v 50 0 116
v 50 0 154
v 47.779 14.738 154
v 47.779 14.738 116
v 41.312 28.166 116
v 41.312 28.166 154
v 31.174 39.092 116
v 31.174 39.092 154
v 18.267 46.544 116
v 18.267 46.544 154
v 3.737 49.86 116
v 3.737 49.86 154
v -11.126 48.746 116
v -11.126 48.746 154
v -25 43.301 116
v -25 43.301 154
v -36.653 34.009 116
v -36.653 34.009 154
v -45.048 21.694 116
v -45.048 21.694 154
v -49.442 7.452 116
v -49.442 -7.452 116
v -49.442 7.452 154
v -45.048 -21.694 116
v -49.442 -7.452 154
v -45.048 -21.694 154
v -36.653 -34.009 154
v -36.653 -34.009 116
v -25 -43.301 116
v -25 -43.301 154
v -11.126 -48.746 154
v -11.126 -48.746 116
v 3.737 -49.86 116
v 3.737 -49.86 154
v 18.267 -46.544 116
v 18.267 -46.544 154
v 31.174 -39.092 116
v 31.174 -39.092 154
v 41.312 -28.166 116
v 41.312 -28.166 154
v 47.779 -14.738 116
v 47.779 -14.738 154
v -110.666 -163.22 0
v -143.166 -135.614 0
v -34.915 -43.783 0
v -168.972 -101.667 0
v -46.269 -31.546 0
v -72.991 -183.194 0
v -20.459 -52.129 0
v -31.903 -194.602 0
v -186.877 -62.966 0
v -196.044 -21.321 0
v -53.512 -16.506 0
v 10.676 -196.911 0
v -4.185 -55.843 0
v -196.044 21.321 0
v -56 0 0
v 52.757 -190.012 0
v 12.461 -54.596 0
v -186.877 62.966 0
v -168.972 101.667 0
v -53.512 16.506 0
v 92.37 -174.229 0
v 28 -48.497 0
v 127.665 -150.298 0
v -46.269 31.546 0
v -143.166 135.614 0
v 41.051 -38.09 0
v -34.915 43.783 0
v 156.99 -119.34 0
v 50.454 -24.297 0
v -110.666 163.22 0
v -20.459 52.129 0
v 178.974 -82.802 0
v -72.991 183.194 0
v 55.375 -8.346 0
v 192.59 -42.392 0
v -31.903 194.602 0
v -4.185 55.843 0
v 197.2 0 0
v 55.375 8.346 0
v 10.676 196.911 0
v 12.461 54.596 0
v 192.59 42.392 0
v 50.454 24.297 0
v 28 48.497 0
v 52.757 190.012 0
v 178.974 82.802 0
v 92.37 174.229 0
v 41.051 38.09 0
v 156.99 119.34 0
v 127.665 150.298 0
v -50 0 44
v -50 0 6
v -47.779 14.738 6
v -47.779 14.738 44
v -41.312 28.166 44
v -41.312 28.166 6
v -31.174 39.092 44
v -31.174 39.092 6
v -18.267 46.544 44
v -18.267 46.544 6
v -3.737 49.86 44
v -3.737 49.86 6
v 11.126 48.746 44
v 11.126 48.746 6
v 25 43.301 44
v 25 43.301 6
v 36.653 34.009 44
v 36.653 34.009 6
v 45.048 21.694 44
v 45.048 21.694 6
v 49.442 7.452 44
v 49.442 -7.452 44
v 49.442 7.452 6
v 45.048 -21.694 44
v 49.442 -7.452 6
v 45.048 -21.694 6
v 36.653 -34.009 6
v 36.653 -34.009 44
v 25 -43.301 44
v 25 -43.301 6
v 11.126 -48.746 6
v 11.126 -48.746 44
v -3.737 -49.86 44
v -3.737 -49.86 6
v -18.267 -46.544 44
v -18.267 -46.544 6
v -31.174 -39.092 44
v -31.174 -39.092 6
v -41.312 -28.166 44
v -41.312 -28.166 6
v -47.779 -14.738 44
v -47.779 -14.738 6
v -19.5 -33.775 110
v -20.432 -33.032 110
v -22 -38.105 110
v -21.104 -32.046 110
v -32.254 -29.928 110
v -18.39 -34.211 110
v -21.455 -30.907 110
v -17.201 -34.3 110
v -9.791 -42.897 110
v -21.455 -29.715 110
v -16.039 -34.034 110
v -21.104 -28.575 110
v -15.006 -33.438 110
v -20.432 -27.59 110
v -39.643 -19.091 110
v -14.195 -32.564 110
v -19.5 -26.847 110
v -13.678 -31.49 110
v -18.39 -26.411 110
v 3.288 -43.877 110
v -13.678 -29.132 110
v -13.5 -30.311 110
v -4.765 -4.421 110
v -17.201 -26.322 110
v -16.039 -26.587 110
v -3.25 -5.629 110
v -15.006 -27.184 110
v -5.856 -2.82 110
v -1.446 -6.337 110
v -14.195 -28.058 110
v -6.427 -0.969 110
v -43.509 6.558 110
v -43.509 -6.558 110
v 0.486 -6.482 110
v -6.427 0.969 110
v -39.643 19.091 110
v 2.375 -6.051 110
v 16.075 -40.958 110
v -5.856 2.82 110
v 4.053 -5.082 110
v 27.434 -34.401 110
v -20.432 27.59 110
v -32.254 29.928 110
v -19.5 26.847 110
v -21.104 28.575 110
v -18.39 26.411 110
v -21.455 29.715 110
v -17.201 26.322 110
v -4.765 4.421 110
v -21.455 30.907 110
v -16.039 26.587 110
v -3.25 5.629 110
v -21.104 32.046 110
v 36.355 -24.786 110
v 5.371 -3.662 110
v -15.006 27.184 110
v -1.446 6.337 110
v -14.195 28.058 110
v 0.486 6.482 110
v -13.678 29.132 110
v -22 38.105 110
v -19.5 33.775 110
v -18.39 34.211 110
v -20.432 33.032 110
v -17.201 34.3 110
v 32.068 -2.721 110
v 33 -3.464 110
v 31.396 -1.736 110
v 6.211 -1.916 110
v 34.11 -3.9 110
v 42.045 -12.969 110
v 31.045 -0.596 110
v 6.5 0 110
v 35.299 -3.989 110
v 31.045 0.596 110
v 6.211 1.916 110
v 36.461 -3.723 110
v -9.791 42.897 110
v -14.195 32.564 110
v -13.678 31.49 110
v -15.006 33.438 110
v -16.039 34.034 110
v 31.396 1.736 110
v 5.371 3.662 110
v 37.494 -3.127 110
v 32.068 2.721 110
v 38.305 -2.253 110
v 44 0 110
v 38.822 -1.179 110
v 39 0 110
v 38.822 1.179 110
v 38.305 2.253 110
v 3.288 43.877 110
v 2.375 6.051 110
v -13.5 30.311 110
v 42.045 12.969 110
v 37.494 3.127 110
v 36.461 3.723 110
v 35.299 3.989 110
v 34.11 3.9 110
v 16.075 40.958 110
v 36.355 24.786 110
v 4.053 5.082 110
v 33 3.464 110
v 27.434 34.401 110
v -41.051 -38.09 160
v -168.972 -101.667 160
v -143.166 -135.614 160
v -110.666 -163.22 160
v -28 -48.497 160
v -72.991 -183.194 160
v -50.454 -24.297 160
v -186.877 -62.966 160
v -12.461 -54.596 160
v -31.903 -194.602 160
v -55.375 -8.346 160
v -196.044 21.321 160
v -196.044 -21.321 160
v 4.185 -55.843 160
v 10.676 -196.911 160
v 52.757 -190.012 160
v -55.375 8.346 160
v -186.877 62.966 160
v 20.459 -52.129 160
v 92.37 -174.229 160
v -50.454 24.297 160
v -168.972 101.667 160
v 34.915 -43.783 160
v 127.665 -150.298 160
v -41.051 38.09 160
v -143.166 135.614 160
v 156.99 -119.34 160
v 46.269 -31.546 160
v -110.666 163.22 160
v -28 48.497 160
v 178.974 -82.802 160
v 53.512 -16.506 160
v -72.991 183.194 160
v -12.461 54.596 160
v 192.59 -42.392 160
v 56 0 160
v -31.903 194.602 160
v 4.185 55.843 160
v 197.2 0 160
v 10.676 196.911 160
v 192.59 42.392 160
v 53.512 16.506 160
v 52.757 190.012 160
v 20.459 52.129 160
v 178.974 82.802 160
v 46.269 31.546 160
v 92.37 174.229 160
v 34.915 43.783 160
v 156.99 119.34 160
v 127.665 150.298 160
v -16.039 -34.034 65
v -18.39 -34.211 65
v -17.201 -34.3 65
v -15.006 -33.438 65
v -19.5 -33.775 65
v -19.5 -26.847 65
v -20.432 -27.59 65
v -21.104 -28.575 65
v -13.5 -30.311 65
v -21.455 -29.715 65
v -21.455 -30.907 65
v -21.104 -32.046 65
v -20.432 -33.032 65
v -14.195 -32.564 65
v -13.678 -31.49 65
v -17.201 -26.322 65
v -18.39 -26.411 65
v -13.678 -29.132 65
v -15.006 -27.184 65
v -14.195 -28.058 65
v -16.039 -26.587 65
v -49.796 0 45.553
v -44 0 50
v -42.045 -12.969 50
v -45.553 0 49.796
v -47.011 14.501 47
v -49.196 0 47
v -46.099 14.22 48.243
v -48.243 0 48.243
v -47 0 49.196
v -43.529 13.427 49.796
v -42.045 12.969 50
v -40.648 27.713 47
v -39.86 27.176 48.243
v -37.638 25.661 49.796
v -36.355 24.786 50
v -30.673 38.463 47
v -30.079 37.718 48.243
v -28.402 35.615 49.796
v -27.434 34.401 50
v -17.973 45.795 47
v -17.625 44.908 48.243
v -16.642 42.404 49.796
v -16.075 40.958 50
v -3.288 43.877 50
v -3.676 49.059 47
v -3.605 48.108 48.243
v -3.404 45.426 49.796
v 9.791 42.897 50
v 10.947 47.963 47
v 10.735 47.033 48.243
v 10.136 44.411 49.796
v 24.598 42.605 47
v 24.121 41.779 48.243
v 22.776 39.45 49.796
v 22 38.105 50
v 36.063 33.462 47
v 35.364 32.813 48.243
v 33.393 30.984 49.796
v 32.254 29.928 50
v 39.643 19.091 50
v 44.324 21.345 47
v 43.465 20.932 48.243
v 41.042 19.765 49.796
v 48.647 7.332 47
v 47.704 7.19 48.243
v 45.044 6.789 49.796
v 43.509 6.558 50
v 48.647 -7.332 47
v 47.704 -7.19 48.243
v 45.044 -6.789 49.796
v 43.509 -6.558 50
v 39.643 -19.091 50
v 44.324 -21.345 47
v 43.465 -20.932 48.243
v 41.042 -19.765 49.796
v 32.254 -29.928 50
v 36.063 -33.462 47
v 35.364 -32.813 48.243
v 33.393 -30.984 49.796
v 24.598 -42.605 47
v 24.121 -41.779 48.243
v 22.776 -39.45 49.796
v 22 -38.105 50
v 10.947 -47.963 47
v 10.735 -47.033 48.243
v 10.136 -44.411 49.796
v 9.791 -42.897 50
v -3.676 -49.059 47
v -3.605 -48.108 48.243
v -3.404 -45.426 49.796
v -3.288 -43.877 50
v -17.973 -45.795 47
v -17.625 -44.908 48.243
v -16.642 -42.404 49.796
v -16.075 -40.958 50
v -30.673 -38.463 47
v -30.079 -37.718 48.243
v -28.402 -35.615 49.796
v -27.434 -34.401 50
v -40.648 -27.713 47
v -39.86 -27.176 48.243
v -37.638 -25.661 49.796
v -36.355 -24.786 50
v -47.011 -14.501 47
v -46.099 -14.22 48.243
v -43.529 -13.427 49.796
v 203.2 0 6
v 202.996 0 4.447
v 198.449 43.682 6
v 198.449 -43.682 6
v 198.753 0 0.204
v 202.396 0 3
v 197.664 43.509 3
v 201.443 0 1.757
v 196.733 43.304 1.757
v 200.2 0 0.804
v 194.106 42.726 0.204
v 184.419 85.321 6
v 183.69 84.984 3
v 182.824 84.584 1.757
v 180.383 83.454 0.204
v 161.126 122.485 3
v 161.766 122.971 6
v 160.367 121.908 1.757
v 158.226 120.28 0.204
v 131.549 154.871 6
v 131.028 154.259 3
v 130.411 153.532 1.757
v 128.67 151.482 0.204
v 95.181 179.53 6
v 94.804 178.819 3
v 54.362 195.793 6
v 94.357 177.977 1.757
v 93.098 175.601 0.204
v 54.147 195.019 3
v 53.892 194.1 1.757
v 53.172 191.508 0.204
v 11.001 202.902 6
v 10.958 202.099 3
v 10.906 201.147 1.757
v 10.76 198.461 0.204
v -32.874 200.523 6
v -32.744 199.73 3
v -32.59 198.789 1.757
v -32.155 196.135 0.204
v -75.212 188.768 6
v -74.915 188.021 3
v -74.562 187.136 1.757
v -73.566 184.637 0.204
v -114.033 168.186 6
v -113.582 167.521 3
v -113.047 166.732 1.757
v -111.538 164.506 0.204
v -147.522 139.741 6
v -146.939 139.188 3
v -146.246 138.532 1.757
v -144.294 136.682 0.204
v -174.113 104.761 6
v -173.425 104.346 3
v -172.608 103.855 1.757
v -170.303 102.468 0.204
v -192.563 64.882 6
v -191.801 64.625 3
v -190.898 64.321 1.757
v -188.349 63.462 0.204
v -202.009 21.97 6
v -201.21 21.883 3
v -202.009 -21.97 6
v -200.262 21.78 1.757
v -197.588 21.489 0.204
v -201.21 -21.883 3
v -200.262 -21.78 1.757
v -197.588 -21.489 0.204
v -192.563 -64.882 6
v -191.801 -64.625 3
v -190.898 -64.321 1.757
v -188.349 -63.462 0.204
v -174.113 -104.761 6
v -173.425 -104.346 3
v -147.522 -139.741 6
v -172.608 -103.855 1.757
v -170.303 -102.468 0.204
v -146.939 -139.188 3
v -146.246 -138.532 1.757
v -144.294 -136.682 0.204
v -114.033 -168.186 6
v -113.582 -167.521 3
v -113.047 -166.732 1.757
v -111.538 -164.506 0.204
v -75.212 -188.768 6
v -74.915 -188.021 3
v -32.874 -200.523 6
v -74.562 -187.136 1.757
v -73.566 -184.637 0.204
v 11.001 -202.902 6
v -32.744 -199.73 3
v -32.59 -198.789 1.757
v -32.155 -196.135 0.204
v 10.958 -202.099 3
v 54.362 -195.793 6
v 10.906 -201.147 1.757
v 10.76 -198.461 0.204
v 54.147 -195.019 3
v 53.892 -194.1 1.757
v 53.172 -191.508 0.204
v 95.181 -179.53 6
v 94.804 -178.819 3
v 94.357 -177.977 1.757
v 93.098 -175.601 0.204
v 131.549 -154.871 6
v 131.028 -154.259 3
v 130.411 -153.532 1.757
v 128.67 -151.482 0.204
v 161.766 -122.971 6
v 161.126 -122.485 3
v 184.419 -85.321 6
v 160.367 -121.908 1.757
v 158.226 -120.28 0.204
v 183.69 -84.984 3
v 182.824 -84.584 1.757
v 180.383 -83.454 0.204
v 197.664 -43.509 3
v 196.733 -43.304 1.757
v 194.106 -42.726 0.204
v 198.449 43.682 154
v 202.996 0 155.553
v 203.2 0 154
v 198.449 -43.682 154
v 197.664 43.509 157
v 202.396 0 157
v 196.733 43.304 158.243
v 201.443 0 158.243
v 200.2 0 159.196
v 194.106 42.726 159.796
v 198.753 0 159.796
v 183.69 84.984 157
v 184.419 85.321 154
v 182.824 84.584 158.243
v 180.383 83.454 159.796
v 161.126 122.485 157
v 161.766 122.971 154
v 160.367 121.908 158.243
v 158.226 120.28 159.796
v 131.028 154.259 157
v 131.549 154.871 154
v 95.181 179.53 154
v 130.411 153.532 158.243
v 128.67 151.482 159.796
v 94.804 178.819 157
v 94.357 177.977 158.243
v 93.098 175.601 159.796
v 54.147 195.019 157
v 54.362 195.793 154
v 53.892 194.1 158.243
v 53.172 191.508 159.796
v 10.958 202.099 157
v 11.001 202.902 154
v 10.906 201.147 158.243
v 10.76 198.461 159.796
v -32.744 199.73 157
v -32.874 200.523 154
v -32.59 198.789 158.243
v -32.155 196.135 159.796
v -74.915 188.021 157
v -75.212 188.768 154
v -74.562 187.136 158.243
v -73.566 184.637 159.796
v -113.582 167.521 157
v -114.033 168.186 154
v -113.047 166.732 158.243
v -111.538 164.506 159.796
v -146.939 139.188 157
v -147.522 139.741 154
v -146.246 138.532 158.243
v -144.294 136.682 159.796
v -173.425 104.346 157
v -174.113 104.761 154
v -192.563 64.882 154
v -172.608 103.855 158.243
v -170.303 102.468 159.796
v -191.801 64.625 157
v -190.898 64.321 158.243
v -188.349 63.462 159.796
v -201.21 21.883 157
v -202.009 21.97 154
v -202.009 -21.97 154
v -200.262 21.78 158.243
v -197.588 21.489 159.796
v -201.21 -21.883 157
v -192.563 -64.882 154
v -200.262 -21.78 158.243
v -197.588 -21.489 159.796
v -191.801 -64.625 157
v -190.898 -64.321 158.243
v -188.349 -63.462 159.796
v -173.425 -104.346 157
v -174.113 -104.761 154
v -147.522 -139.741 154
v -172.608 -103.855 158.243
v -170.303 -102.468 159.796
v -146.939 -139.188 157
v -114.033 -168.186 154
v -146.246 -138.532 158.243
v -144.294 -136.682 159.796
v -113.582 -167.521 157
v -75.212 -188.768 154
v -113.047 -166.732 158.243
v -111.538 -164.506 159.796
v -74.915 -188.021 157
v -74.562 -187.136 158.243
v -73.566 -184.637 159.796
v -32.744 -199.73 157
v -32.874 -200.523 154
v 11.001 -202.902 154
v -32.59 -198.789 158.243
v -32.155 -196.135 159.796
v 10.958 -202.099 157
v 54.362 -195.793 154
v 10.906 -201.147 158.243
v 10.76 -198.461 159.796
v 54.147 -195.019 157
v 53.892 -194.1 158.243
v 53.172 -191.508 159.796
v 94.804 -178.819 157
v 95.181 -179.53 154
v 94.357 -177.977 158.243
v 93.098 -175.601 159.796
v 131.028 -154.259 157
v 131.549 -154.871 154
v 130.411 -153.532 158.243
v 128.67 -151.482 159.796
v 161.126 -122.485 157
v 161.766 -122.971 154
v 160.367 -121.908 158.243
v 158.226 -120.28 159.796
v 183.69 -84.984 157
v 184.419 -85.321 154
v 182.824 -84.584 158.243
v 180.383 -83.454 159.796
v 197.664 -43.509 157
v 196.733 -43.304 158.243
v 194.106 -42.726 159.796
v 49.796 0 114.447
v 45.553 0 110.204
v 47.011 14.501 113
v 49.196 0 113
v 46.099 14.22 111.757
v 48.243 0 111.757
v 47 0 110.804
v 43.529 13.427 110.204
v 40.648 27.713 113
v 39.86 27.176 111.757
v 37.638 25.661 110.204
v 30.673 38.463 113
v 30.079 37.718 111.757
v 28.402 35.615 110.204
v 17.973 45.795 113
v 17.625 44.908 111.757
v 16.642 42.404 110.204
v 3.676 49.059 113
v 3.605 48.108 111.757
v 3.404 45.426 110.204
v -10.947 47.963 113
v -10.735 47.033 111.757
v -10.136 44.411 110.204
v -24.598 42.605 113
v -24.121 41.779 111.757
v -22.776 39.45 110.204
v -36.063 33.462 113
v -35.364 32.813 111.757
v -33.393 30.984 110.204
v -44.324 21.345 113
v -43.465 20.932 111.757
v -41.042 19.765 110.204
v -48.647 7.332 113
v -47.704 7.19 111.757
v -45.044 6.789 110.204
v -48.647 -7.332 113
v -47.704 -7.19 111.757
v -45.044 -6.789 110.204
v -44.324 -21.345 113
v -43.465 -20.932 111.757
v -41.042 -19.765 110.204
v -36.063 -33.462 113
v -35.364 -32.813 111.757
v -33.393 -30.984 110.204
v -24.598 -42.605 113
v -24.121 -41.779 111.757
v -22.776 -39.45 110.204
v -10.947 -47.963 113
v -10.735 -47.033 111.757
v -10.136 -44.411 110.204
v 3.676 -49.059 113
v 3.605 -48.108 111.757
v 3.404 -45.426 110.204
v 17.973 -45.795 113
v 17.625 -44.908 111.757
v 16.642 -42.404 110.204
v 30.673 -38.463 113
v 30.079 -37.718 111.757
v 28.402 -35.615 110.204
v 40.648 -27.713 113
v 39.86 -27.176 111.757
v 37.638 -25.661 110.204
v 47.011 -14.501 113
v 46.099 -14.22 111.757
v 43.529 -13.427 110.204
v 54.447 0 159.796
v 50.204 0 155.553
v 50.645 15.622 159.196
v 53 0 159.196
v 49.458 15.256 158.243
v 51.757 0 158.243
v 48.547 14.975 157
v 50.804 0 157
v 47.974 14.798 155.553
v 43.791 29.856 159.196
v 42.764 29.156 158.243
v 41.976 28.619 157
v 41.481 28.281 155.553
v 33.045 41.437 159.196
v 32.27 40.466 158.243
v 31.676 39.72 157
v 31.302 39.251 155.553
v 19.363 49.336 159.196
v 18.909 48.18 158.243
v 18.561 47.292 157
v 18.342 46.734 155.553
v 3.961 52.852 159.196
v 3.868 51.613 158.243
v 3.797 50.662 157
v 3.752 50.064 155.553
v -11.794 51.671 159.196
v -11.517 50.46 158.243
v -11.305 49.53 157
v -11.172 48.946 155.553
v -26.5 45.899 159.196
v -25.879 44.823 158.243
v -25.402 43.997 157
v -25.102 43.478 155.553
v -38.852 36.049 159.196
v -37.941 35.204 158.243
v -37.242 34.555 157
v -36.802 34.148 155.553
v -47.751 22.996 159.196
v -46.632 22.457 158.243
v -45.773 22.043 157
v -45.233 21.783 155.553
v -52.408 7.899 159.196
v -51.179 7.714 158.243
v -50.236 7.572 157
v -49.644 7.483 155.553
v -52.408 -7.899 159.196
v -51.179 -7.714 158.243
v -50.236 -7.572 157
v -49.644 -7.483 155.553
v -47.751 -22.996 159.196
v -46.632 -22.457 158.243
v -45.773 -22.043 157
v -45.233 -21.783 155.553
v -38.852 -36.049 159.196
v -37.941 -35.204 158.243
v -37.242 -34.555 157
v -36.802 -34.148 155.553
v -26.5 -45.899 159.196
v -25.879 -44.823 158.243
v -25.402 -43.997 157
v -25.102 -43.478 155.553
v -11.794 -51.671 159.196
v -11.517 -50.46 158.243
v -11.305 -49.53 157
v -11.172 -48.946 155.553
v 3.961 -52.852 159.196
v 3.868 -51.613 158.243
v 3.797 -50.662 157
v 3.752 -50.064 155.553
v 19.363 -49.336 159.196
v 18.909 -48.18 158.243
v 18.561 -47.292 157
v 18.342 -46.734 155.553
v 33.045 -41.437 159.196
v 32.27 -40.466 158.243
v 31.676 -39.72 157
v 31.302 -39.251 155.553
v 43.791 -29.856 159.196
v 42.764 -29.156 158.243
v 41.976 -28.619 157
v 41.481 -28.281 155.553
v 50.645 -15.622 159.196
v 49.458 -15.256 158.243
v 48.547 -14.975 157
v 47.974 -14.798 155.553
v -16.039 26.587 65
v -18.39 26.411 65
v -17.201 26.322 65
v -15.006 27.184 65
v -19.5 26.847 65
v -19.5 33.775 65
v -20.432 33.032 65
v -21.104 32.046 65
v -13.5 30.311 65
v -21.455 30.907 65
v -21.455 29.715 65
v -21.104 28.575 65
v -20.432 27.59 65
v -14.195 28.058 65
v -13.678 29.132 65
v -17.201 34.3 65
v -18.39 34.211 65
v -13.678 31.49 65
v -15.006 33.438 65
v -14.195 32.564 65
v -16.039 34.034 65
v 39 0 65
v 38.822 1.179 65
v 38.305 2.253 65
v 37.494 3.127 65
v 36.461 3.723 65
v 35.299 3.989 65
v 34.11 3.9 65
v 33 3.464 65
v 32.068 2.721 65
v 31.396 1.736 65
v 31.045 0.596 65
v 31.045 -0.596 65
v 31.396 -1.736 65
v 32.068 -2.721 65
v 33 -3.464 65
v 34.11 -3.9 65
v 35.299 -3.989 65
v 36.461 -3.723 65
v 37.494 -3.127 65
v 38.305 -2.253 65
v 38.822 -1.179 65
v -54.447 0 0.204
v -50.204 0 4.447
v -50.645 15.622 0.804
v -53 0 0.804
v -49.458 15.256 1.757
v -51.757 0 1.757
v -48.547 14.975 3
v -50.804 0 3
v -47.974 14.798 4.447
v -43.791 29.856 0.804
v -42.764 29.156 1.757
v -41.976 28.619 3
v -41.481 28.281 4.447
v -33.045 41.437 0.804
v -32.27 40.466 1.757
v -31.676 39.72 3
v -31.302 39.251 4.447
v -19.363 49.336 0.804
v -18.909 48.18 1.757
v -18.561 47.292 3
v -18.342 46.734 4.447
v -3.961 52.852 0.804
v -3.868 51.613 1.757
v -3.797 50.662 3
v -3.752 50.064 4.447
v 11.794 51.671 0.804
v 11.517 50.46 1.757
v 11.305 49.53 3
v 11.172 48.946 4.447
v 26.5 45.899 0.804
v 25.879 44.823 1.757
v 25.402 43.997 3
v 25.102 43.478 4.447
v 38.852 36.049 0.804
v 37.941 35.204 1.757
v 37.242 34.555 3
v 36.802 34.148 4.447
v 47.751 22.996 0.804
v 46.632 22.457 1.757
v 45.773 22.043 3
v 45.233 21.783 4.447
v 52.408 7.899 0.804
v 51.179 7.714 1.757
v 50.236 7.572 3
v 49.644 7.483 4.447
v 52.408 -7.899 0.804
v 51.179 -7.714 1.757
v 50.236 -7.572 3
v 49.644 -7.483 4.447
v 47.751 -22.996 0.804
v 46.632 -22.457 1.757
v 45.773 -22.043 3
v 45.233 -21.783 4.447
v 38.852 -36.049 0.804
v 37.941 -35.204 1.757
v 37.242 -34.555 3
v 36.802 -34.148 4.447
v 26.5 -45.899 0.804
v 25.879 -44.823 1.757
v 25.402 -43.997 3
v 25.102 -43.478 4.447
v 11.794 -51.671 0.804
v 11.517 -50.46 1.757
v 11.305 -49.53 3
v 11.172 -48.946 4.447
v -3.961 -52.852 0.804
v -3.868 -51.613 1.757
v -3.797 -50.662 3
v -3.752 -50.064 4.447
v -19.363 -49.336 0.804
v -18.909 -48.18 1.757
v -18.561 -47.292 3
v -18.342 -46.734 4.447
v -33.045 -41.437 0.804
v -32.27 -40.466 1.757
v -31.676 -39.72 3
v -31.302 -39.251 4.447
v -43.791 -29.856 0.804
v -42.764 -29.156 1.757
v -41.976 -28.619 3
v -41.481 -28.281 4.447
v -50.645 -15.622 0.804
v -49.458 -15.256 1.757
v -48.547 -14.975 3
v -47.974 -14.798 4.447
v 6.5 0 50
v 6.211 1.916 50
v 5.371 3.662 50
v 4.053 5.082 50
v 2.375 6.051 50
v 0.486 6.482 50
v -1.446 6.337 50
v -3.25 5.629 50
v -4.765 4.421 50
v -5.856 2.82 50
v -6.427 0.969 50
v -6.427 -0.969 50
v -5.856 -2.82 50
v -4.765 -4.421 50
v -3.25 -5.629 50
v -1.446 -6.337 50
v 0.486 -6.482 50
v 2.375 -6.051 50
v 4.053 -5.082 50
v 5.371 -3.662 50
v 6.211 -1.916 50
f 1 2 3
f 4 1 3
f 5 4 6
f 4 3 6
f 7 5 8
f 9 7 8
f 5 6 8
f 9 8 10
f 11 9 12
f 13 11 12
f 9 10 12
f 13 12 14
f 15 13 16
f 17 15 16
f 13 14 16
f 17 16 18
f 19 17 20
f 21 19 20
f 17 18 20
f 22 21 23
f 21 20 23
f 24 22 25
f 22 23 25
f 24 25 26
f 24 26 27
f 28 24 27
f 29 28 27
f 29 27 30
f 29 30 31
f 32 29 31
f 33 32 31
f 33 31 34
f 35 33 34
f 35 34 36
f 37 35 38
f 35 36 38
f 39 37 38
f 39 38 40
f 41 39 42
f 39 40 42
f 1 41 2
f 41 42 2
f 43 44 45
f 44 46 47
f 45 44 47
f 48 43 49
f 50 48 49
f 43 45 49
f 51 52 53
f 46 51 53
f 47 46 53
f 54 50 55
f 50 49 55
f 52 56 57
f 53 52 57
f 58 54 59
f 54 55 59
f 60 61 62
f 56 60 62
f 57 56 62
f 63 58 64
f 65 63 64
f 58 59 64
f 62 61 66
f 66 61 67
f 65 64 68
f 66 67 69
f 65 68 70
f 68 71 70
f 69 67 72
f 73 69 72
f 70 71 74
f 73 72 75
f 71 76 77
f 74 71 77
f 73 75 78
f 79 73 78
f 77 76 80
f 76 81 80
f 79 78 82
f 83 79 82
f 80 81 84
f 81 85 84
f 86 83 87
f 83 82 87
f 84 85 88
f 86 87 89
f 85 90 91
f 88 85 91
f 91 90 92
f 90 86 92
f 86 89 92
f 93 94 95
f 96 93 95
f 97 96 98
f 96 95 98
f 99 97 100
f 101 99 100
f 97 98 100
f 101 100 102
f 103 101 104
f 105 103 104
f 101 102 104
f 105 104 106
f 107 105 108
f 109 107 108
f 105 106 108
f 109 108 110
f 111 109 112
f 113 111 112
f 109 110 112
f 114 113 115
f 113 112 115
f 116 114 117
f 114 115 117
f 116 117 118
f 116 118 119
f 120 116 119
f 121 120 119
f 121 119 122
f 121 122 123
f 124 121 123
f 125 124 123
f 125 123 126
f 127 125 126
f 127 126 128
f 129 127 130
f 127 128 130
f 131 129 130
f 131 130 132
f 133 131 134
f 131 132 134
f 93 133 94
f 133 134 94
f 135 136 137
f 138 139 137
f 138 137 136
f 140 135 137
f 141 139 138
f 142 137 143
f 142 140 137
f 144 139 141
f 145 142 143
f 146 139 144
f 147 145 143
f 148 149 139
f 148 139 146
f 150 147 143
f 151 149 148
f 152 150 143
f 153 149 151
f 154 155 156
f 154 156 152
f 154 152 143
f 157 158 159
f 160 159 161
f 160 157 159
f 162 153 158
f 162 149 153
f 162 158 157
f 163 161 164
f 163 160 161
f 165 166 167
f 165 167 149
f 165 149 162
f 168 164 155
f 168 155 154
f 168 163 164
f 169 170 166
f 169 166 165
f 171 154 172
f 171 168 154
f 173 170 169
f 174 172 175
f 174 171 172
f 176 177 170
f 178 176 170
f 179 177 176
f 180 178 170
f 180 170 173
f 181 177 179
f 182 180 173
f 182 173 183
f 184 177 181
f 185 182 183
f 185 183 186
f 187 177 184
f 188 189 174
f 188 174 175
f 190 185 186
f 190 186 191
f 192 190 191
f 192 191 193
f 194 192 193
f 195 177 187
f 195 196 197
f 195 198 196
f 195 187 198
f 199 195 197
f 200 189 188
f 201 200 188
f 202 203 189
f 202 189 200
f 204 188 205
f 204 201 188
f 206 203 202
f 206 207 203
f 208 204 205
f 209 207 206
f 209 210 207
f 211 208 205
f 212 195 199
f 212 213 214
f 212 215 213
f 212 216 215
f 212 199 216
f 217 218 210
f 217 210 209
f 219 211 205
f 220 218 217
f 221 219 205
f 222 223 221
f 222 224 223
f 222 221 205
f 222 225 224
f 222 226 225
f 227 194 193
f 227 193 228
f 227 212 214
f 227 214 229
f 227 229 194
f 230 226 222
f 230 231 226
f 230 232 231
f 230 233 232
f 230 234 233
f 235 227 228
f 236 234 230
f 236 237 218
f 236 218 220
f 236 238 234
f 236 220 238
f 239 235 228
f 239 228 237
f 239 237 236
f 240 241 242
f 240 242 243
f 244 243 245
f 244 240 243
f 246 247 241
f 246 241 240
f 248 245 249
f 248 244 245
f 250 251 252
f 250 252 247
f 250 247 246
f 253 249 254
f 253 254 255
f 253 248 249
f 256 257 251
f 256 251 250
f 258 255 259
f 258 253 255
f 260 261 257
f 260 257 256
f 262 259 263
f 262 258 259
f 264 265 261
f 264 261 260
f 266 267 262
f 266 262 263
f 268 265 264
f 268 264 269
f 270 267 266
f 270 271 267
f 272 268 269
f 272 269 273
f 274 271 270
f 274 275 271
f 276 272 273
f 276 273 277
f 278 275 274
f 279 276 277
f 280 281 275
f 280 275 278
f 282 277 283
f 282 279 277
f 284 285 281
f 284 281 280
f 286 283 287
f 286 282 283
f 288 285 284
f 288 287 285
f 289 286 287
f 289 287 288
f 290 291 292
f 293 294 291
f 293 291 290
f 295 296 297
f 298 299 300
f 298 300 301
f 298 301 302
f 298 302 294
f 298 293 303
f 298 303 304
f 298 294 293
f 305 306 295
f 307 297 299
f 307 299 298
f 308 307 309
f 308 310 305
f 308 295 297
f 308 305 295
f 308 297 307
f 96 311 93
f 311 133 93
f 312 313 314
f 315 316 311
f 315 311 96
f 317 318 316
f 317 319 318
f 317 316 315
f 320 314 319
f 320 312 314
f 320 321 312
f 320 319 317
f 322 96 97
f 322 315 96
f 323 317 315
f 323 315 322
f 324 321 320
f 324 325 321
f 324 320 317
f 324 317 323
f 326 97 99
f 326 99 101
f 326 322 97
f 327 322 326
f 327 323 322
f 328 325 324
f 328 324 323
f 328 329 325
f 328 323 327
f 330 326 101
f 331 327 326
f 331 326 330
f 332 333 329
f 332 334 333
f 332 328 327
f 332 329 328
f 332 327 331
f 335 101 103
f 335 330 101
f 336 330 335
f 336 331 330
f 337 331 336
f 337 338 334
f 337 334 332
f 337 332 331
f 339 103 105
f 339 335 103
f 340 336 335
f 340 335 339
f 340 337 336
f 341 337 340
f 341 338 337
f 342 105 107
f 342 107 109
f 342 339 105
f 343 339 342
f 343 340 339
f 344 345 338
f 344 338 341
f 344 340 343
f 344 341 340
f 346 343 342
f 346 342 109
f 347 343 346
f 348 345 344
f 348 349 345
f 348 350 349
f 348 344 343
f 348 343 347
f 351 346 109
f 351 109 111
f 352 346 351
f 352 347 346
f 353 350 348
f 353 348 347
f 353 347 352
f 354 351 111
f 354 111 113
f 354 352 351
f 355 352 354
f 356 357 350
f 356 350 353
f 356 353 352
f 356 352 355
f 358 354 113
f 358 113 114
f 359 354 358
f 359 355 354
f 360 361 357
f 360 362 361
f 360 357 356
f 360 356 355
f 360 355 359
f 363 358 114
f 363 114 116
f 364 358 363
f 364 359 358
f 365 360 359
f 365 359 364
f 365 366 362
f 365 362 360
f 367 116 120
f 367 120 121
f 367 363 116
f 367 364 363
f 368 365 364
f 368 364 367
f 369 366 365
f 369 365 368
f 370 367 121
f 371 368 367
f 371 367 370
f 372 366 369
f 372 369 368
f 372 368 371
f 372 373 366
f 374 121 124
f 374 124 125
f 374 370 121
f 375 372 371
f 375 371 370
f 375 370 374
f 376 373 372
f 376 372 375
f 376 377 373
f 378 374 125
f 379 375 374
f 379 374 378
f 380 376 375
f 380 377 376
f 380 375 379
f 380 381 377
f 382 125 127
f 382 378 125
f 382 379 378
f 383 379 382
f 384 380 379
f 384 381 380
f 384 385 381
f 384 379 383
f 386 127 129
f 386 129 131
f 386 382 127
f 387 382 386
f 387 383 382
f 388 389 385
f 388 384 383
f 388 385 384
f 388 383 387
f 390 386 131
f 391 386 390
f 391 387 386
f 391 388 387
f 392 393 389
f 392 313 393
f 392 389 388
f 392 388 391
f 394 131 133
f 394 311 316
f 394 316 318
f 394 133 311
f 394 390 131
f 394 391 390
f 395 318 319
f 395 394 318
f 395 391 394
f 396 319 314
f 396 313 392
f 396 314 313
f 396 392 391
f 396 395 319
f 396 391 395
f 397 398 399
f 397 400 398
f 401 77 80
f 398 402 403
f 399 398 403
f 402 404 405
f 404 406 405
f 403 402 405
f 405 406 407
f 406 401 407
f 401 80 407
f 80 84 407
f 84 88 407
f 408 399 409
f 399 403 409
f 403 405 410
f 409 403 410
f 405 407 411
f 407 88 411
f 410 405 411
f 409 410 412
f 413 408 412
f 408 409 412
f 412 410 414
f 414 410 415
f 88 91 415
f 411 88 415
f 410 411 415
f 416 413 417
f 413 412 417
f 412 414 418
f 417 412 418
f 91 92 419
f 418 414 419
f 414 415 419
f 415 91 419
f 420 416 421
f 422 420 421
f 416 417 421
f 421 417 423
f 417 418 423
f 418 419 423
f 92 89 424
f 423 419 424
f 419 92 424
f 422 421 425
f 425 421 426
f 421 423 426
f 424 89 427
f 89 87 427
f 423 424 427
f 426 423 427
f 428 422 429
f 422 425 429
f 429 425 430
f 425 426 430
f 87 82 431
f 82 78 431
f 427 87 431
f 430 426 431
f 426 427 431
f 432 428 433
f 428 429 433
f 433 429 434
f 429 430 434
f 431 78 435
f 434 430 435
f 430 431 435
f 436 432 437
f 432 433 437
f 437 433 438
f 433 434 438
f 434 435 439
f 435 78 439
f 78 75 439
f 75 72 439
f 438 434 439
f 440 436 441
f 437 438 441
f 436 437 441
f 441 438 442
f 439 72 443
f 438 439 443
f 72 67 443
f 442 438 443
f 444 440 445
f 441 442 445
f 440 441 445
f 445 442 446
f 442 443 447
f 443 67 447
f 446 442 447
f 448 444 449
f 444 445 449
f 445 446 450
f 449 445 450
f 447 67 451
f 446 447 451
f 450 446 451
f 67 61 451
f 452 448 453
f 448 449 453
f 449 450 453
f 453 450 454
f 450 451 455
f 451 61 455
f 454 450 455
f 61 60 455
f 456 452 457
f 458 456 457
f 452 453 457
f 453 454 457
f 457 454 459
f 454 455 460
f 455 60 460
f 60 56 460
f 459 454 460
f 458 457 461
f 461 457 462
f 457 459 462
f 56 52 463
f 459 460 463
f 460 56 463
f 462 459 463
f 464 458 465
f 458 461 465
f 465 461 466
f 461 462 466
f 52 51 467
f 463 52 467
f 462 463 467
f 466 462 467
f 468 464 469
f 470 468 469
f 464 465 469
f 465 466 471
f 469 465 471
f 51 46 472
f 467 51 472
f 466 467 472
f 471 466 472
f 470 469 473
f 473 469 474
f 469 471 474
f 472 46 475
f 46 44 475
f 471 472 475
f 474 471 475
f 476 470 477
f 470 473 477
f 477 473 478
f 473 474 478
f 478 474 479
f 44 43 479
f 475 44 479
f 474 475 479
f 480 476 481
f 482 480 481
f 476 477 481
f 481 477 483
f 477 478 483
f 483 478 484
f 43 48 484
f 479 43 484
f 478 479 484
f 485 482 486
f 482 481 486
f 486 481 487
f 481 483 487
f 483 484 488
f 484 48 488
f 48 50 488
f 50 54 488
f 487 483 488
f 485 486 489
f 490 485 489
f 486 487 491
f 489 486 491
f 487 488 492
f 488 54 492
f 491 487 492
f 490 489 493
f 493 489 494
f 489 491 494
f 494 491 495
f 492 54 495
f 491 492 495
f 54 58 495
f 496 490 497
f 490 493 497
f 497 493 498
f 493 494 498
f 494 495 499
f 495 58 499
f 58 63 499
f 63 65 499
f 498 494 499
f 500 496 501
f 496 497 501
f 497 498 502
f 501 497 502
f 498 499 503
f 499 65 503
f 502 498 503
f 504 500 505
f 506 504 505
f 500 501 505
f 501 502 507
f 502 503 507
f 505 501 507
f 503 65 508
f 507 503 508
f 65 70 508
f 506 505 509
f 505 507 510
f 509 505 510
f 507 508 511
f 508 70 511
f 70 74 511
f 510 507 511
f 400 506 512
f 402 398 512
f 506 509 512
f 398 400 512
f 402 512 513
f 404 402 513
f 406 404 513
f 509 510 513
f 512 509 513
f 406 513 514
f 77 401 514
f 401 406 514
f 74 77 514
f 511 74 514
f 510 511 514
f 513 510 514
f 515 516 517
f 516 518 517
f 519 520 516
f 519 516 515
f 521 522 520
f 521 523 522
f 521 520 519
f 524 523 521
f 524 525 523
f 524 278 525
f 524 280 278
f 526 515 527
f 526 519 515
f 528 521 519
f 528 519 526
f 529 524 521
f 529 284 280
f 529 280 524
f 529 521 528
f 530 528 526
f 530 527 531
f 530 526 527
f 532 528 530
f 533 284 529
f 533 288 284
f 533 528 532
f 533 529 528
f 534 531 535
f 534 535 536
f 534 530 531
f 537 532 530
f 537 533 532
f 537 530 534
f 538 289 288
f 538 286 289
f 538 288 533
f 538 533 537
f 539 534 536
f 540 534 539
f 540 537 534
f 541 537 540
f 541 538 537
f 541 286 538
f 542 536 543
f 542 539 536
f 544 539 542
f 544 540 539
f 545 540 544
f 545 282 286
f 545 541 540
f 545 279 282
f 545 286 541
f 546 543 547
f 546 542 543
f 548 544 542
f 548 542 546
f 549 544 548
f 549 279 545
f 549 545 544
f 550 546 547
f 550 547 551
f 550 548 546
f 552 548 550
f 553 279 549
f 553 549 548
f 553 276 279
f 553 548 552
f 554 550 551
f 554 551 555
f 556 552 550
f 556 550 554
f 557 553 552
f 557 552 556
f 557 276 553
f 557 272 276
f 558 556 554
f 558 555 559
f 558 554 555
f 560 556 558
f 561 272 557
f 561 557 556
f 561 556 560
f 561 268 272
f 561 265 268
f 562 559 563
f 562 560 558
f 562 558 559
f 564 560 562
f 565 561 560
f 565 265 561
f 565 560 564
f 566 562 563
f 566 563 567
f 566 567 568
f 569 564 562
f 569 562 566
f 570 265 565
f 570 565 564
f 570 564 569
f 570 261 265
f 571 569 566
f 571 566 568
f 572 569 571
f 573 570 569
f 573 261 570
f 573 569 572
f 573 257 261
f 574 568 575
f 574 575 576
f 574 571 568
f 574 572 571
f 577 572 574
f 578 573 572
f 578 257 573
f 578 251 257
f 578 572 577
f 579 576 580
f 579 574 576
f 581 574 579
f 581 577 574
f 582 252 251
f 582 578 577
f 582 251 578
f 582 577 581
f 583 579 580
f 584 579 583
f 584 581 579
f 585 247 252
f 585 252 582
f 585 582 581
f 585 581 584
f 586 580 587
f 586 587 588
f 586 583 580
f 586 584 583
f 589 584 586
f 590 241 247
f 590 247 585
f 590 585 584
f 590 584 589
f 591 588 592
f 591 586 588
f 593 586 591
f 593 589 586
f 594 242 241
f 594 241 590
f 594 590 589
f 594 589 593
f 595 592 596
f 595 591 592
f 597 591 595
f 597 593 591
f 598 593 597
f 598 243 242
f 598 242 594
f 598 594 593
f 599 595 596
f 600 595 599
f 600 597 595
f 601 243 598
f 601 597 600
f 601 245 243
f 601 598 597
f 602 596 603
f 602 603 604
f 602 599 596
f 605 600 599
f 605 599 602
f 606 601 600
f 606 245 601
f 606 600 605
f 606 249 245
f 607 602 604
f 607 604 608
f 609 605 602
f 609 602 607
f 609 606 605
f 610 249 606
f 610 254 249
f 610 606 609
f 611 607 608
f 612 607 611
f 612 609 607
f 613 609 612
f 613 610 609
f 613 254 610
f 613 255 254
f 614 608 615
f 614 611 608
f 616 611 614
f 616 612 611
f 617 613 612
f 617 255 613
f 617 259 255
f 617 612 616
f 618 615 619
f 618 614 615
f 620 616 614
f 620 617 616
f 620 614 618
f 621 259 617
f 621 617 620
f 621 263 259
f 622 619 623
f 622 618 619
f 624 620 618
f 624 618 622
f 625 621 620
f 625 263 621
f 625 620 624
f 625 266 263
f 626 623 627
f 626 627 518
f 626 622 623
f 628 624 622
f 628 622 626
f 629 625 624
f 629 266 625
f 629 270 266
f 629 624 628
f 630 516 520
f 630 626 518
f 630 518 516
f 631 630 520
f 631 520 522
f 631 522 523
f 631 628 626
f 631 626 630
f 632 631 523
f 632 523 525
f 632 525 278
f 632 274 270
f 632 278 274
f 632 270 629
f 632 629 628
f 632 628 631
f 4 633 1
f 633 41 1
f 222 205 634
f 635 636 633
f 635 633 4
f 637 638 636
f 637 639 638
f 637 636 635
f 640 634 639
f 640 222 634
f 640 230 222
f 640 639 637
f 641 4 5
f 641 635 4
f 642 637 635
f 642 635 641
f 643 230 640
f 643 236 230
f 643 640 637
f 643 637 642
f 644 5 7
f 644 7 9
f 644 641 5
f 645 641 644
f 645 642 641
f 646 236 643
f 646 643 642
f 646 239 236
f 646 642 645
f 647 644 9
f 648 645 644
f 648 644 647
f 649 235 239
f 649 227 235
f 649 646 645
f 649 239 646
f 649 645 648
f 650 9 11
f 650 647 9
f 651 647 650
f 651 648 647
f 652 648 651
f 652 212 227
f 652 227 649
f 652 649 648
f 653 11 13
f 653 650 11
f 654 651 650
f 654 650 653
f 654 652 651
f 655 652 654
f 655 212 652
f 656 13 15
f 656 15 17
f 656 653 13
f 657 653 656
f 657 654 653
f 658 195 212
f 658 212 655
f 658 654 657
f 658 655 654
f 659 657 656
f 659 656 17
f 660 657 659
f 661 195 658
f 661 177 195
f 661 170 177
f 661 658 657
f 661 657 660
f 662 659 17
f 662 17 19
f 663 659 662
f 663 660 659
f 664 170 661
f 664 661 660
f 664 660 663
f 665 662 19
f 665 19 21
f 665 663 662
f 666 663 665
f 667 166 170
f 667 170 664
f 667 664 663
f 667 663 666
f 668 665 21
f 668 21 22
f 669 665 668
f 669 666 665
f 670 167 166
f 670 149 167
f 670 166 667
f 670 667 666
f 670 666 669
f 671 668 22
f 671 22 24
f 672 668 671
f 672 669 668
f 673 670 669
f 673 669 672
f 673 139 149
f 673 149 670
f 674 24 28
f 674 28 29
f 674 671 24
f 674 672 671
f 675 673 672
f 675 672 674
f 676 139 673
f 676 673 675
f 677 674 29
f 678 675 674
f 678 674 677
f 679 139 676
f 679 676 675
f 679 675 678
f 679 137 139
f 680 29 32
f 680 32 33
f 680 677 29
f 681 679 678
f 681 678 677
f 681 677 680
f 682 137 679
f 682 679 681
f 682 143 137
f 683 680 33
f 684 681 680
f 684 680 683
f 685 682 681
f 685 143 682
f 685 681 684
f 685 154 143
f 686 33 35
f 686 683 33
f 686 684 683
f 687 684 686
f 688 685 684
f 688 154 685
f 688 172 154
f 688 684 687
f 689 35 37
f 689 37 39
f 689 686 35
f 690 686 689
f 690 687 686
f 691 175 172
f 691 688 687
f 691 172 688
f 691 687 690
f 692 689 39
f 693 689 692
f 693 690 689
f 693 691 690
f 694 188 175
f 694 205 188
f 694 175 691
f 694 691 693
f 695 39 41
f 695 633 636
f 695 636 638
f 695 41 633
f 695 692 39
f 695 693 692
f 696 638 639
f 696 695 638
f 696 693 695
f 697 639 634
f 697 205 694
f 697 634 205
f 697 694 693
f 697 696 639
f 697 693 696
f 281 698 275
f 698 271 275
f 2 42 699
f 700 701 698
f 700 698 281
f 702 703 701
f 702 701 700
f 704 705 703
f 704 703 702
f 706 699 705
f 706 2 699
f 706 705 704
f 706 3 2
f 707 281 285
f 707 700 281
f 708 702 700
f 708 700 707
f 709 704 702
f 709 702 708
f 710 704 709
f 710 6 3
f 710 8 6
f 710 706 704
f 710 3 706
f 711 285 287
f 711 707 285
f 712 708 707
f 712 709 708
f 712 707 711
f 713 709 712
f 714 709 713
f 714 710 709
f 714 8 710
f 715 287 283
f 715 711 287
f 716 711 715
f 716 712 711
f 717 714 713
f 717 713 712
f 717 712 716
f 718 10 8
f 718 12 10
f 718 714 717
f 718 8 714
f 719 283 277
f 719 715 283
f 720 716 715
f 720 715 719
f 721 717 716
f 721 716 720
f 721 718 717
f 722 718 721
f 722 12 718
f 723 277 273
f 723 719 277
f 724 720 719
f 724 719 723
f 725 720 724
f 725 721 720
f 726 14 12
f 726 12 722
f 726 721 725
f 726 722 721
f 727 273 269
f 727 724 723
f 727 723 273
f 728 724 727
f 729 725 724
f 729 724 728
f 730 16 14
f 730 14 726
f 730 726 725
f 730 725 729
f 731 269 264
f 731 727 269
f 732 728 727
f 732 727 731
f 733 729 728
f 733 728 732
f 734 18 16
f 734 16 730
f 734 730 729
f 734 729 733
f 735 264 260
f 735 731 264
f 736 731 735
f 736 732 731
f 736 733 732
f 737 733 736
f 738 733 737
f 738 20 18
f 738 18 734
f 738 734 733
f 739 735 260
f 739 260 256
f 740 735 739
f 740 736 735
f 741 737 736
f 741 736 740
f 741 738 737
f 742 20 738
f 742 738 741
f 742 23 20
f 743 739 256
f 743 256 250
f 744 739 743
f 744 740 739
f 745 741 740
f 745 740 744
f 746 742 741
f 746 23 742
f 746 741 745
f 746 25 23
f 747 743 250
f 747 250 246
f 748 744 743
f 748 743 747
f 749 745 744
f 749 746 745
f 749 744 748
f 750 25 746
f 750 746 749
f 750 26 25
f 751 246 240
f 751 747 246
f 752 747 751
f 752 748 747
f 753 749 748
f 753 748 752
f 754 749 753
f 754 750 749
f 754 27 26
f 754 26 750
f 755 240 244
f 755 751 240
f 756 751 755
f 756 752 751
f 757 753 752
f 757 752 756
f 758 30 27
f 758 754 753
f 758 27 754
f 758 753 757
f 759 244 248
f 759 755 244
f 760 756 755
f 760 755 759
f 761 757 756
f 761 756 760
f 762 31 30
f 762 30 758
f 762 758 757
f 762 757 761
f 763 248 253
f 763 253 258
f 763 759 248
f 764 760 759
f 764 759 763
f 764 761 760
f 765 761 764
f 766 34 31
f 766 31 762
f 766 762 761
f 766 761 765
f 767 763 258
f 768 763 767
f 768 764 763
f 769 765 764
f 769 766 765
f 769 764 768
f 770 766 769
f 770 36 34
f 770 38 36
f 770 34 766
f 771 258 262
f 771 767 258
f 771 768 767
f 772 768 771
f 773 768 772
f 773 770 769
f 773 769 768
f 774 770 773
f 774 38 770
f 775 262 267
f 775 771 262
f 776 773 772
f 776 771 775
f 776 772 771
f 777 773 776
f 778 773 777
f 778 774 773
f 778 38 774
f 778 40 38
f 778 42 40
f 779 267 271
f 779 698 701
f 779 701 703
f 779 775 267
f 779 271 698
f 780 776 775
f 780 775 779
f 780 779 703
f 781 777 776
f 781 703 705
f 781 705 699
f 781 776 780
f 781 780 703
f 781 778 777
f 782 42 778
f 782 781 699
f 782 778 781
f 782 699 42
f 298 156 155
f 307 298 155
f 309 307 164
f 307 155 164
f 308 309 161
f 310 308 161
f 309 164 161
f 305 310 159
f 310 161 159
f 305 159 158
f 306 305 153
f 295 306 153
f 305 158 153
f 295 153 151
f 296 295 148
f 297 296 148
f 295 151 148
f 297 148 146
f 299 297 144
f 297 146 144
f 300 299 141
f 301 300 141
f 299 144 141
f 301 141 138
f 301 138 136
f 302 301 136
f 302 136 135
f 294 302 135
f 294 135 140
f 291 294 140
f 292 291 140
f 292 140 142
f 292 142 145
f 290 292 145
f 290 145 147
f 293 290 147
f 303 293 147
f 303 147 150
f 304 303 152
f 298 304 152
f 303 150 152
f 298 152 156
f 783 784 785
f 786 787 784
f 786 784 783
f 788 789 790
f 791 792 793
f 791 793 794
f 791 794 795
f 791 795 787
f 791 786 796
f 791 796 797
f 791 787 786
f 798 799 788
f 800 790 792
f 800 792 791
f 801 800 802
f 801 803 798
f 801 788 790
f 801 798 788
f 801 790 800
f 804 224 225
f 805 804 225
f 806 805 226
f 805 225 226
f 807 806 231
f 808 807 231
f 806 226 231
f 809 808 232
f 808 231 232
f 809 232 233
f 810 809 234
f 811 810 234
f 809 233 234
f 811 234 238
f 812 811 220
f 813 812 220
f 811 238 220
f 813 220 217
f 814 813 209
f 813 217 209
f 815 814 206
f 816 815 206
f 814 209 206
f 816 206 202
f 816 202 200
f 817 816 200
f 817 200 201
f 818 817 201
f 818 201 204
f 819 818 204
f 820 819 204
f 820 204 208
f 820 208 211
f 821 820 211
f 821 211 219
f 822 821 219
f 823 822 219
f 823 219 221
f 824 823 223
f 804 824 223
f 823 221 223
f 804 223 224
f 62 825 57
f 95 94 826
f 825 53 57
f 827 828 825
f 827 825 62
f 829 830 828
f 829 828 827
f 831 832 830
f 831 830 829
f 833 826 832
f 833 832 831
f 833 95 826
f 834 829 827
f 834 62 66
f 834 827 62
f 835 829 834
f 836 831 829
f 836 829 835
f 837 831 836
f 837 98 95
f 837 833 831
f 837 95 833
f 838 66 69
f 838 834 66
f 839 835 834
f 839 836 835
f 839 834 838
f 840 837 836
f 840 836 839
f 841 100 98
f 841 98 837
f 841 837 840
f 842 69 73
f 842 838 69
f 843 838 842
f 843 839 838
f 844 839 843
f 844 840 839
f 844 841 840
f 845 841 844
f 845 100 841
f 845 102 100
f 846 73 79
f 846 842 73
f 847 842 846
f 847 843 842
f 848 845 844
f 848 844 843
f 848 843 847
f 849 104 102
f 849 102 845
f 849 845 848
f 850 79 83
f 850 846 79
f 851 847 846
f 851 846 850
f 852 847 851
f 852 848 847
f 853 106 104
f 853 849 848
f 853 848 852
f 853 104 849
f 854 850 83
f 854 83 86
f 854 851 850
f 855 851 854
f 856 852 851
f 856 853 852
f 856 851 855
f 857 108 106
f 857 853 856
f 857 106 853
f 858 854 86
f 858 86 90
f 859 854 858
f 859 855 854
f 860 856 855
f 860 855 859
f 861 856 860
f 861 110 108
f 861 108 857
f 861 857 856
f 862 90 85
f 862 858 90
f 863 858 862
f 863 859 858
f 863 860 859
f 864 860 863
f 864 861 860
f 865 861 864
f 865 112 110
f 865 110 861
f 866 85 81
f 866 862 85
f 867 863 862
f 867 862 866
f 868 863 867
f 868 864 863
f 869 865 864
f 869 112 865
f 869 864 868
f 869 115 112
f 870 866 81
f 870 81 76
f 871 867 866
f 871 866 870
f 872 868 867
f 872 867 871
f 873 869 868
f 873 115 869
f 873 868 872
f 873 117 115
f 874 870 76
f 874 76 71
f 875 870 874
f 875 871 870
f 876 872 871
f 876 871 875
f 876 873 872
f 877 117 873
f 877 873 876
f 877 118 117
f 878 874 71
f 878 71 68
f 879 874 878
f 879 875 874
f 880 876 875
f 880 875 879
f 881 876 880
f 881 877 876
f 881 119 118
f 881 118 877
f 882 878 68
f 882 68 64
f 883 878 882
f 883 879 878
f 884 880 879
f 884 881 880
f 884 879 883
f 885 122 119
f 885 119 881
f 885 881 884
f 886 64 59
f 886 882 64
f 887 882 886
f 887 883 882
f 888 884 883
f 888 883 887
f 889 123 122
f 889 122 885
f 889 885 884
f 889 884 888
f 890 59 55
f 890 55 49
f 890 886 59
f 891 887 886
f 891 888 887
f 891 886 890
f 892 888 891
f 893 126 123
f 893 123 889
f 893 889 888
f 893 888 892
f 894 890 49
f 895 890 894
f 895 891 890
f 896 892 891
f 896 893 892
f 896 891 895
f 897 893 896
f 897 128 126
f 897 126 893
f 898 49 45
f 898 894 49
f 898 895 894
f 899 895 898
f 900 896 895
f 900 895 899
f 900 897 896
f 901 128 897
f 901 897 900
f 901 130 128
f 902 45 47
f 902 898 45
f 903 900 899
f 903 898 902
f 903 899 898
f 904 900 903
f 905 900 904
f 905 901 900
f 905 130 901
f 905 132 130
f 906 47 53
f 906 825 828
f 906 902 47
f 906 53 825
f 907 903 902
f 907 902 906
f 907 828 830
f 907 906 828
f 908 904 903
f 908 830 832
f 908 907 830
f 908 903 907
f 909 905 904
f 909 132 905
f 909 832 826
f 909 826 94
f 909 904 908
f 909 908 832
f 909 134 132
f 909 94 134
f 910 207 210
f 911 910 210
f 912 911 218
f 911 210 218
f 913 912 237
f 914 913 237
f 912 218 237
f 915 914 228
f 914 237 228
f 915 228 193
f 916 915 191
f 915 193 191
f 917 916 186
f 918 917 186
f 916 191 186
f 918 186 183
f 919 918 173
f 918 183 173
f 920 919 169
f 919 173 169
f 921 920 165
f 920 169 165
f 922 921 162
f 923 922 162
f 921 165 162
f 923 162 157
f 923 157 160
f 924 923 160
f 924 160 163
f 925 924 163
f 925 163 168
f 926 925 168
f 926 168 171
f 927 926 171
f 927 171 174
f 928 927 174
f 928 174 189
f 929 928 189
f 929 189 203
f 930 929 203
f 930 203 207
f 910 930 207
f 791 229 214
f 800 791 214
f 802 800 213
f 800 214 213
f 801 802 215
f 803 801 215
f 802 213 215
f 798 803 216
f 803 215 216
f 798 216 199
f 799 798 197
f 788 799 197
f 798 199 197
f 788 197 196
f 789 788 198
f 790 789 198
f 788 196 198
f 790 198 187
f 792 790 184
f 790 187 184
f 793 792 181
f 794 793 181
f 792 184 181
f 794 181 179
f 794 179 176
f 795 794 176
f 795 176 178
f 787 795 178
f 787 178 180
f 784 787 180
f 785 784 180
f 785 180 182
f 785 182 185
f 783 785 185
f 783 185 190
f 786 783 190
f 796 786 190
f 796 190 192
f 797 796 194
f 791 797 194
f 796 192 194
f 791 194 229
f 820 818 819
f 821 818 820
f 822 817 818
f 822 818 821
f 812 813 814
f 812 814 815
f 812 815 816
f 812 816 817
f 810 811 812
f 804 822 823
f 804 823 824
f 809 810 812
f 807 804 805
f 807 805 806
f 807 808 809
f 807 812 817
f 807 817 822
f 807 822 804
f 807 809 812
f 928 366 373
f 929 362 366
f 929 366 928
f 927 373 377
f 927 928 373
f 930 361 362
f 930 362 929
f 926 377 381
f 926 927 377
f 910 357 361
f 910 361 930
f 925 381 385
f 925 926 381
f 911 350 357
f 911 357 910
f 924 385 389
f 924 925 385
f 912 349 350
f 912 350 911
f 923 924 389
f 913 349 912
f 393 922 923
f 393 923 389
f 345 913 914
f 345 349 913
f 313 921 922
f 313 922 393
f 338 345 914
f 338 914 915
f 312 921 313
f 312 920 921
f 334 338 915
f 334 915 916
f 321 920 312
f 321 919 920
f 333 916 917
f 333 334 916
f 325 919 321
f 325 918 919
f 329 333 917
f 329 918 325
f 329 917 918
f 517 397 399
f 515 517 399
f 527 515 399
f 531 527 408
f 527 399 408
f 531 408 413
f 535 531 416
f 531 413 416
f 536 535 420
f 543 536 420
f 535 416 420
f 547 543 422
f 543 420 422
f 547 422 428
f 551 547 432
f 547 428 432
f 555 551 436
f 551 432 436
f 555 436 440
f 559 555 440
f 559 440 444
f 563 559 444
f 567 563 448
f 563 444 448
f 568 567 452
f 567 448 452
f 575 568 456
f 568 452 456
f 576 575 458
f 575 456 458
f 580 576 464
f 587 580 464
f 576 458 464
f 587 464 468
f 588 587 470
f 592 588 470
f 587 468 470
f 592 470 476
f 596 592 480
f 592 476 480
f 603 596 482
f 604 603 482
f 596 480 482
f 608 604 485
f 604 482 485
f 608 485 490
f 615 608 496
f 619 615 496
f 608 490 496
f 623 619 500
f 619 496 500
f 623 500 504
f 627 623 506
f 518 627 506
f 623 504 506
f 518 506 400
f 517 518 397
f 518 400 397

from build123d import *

# Parameters (mm, degrees)
SKETCH1_R           = 203.2
BOSS_EXTRUDE2_DEPTH = 160
SKETCH3_R           = 50
CUT_EXTRUDE1_DEPTH  = 50
SKETCH4_R           = 50
CUT_EXTRUDE2_DEPTH  = 50
FILLET1_R           = 6
SKETCH5_R           = 4
CUT_EXTRUDE3_DEPTH  = 45
SKETCH6_R           = 6.5
CUT_EXTRUDE4_DEPTH  = 111


with BuildPart() as part:
    # Sketch1 → Boss-Extrude2 (new body)
    with BuildSketch(Plane.XY):
        Circle(SKETCH1_R)
    extrude(amount=BOSS_EXTRUDE2_DEPTH)

    # Sketch3 → Cut-Extrude1 (cut)
    with BuildSketch(Plane.XY.offset(160)):
        Circle(SKETCH3_R)
    extrude(amount=-CUT_EXTRUDE1_DEPTH, mode=Mode.SUBTRACT)

    # Sketch4 → Cut-Extrude2 (cut)
    with BuildSketch(Plane(origin=(0, 0, 0), x_dir=(-1, 0, 0), z_dir=(0, 0, -1))):
        Circle(SKETCH4_R)
    extrude(amount=-CUT_EXTRUDE2_DEPTH, mode=Mode.SUBTRACT)

    # Fillet1
    fillet1_edges = [part.edges().sort_by_distance(p)[0] for p in [
        (50, 0, 50),
        (50, 0, 0),
        (-203.2, 0, 0),
        (-203.2, 0, 160),
        (-50, 0, 110),
        (-50, 0, 160),
    ]]
    fillet(fillet1_edges, radius=FILLET1_R)

    # Sketch5 → Cut-Extrude3 (cut)
    with BuildSketch(Plane.XY.offset(110)):
        with Locations((35, 0)):
            Circle(SKETCH5_R)
        with Locations((-17.5, -30.310889132)):
            Circle(SKETCH5_R)
        with Locations((-17.5, 30.310889132)):
            Circle(SKETCH5_R)
    extrude(amount=-CUT_EXTRUDE3_DEPTH, mode=Mode.SUBTRACT)

    # Sketch6 → Cut-Extrude4 (cut, through all)
    with BuildSketch(Plane.XY.offset(110)):
        Circle(SKETCH6_R)
    extrude(amount=-CUT_EXTRUDE4_DEPTH, mode=Mode.SUBTRACT)


solid = part.part
